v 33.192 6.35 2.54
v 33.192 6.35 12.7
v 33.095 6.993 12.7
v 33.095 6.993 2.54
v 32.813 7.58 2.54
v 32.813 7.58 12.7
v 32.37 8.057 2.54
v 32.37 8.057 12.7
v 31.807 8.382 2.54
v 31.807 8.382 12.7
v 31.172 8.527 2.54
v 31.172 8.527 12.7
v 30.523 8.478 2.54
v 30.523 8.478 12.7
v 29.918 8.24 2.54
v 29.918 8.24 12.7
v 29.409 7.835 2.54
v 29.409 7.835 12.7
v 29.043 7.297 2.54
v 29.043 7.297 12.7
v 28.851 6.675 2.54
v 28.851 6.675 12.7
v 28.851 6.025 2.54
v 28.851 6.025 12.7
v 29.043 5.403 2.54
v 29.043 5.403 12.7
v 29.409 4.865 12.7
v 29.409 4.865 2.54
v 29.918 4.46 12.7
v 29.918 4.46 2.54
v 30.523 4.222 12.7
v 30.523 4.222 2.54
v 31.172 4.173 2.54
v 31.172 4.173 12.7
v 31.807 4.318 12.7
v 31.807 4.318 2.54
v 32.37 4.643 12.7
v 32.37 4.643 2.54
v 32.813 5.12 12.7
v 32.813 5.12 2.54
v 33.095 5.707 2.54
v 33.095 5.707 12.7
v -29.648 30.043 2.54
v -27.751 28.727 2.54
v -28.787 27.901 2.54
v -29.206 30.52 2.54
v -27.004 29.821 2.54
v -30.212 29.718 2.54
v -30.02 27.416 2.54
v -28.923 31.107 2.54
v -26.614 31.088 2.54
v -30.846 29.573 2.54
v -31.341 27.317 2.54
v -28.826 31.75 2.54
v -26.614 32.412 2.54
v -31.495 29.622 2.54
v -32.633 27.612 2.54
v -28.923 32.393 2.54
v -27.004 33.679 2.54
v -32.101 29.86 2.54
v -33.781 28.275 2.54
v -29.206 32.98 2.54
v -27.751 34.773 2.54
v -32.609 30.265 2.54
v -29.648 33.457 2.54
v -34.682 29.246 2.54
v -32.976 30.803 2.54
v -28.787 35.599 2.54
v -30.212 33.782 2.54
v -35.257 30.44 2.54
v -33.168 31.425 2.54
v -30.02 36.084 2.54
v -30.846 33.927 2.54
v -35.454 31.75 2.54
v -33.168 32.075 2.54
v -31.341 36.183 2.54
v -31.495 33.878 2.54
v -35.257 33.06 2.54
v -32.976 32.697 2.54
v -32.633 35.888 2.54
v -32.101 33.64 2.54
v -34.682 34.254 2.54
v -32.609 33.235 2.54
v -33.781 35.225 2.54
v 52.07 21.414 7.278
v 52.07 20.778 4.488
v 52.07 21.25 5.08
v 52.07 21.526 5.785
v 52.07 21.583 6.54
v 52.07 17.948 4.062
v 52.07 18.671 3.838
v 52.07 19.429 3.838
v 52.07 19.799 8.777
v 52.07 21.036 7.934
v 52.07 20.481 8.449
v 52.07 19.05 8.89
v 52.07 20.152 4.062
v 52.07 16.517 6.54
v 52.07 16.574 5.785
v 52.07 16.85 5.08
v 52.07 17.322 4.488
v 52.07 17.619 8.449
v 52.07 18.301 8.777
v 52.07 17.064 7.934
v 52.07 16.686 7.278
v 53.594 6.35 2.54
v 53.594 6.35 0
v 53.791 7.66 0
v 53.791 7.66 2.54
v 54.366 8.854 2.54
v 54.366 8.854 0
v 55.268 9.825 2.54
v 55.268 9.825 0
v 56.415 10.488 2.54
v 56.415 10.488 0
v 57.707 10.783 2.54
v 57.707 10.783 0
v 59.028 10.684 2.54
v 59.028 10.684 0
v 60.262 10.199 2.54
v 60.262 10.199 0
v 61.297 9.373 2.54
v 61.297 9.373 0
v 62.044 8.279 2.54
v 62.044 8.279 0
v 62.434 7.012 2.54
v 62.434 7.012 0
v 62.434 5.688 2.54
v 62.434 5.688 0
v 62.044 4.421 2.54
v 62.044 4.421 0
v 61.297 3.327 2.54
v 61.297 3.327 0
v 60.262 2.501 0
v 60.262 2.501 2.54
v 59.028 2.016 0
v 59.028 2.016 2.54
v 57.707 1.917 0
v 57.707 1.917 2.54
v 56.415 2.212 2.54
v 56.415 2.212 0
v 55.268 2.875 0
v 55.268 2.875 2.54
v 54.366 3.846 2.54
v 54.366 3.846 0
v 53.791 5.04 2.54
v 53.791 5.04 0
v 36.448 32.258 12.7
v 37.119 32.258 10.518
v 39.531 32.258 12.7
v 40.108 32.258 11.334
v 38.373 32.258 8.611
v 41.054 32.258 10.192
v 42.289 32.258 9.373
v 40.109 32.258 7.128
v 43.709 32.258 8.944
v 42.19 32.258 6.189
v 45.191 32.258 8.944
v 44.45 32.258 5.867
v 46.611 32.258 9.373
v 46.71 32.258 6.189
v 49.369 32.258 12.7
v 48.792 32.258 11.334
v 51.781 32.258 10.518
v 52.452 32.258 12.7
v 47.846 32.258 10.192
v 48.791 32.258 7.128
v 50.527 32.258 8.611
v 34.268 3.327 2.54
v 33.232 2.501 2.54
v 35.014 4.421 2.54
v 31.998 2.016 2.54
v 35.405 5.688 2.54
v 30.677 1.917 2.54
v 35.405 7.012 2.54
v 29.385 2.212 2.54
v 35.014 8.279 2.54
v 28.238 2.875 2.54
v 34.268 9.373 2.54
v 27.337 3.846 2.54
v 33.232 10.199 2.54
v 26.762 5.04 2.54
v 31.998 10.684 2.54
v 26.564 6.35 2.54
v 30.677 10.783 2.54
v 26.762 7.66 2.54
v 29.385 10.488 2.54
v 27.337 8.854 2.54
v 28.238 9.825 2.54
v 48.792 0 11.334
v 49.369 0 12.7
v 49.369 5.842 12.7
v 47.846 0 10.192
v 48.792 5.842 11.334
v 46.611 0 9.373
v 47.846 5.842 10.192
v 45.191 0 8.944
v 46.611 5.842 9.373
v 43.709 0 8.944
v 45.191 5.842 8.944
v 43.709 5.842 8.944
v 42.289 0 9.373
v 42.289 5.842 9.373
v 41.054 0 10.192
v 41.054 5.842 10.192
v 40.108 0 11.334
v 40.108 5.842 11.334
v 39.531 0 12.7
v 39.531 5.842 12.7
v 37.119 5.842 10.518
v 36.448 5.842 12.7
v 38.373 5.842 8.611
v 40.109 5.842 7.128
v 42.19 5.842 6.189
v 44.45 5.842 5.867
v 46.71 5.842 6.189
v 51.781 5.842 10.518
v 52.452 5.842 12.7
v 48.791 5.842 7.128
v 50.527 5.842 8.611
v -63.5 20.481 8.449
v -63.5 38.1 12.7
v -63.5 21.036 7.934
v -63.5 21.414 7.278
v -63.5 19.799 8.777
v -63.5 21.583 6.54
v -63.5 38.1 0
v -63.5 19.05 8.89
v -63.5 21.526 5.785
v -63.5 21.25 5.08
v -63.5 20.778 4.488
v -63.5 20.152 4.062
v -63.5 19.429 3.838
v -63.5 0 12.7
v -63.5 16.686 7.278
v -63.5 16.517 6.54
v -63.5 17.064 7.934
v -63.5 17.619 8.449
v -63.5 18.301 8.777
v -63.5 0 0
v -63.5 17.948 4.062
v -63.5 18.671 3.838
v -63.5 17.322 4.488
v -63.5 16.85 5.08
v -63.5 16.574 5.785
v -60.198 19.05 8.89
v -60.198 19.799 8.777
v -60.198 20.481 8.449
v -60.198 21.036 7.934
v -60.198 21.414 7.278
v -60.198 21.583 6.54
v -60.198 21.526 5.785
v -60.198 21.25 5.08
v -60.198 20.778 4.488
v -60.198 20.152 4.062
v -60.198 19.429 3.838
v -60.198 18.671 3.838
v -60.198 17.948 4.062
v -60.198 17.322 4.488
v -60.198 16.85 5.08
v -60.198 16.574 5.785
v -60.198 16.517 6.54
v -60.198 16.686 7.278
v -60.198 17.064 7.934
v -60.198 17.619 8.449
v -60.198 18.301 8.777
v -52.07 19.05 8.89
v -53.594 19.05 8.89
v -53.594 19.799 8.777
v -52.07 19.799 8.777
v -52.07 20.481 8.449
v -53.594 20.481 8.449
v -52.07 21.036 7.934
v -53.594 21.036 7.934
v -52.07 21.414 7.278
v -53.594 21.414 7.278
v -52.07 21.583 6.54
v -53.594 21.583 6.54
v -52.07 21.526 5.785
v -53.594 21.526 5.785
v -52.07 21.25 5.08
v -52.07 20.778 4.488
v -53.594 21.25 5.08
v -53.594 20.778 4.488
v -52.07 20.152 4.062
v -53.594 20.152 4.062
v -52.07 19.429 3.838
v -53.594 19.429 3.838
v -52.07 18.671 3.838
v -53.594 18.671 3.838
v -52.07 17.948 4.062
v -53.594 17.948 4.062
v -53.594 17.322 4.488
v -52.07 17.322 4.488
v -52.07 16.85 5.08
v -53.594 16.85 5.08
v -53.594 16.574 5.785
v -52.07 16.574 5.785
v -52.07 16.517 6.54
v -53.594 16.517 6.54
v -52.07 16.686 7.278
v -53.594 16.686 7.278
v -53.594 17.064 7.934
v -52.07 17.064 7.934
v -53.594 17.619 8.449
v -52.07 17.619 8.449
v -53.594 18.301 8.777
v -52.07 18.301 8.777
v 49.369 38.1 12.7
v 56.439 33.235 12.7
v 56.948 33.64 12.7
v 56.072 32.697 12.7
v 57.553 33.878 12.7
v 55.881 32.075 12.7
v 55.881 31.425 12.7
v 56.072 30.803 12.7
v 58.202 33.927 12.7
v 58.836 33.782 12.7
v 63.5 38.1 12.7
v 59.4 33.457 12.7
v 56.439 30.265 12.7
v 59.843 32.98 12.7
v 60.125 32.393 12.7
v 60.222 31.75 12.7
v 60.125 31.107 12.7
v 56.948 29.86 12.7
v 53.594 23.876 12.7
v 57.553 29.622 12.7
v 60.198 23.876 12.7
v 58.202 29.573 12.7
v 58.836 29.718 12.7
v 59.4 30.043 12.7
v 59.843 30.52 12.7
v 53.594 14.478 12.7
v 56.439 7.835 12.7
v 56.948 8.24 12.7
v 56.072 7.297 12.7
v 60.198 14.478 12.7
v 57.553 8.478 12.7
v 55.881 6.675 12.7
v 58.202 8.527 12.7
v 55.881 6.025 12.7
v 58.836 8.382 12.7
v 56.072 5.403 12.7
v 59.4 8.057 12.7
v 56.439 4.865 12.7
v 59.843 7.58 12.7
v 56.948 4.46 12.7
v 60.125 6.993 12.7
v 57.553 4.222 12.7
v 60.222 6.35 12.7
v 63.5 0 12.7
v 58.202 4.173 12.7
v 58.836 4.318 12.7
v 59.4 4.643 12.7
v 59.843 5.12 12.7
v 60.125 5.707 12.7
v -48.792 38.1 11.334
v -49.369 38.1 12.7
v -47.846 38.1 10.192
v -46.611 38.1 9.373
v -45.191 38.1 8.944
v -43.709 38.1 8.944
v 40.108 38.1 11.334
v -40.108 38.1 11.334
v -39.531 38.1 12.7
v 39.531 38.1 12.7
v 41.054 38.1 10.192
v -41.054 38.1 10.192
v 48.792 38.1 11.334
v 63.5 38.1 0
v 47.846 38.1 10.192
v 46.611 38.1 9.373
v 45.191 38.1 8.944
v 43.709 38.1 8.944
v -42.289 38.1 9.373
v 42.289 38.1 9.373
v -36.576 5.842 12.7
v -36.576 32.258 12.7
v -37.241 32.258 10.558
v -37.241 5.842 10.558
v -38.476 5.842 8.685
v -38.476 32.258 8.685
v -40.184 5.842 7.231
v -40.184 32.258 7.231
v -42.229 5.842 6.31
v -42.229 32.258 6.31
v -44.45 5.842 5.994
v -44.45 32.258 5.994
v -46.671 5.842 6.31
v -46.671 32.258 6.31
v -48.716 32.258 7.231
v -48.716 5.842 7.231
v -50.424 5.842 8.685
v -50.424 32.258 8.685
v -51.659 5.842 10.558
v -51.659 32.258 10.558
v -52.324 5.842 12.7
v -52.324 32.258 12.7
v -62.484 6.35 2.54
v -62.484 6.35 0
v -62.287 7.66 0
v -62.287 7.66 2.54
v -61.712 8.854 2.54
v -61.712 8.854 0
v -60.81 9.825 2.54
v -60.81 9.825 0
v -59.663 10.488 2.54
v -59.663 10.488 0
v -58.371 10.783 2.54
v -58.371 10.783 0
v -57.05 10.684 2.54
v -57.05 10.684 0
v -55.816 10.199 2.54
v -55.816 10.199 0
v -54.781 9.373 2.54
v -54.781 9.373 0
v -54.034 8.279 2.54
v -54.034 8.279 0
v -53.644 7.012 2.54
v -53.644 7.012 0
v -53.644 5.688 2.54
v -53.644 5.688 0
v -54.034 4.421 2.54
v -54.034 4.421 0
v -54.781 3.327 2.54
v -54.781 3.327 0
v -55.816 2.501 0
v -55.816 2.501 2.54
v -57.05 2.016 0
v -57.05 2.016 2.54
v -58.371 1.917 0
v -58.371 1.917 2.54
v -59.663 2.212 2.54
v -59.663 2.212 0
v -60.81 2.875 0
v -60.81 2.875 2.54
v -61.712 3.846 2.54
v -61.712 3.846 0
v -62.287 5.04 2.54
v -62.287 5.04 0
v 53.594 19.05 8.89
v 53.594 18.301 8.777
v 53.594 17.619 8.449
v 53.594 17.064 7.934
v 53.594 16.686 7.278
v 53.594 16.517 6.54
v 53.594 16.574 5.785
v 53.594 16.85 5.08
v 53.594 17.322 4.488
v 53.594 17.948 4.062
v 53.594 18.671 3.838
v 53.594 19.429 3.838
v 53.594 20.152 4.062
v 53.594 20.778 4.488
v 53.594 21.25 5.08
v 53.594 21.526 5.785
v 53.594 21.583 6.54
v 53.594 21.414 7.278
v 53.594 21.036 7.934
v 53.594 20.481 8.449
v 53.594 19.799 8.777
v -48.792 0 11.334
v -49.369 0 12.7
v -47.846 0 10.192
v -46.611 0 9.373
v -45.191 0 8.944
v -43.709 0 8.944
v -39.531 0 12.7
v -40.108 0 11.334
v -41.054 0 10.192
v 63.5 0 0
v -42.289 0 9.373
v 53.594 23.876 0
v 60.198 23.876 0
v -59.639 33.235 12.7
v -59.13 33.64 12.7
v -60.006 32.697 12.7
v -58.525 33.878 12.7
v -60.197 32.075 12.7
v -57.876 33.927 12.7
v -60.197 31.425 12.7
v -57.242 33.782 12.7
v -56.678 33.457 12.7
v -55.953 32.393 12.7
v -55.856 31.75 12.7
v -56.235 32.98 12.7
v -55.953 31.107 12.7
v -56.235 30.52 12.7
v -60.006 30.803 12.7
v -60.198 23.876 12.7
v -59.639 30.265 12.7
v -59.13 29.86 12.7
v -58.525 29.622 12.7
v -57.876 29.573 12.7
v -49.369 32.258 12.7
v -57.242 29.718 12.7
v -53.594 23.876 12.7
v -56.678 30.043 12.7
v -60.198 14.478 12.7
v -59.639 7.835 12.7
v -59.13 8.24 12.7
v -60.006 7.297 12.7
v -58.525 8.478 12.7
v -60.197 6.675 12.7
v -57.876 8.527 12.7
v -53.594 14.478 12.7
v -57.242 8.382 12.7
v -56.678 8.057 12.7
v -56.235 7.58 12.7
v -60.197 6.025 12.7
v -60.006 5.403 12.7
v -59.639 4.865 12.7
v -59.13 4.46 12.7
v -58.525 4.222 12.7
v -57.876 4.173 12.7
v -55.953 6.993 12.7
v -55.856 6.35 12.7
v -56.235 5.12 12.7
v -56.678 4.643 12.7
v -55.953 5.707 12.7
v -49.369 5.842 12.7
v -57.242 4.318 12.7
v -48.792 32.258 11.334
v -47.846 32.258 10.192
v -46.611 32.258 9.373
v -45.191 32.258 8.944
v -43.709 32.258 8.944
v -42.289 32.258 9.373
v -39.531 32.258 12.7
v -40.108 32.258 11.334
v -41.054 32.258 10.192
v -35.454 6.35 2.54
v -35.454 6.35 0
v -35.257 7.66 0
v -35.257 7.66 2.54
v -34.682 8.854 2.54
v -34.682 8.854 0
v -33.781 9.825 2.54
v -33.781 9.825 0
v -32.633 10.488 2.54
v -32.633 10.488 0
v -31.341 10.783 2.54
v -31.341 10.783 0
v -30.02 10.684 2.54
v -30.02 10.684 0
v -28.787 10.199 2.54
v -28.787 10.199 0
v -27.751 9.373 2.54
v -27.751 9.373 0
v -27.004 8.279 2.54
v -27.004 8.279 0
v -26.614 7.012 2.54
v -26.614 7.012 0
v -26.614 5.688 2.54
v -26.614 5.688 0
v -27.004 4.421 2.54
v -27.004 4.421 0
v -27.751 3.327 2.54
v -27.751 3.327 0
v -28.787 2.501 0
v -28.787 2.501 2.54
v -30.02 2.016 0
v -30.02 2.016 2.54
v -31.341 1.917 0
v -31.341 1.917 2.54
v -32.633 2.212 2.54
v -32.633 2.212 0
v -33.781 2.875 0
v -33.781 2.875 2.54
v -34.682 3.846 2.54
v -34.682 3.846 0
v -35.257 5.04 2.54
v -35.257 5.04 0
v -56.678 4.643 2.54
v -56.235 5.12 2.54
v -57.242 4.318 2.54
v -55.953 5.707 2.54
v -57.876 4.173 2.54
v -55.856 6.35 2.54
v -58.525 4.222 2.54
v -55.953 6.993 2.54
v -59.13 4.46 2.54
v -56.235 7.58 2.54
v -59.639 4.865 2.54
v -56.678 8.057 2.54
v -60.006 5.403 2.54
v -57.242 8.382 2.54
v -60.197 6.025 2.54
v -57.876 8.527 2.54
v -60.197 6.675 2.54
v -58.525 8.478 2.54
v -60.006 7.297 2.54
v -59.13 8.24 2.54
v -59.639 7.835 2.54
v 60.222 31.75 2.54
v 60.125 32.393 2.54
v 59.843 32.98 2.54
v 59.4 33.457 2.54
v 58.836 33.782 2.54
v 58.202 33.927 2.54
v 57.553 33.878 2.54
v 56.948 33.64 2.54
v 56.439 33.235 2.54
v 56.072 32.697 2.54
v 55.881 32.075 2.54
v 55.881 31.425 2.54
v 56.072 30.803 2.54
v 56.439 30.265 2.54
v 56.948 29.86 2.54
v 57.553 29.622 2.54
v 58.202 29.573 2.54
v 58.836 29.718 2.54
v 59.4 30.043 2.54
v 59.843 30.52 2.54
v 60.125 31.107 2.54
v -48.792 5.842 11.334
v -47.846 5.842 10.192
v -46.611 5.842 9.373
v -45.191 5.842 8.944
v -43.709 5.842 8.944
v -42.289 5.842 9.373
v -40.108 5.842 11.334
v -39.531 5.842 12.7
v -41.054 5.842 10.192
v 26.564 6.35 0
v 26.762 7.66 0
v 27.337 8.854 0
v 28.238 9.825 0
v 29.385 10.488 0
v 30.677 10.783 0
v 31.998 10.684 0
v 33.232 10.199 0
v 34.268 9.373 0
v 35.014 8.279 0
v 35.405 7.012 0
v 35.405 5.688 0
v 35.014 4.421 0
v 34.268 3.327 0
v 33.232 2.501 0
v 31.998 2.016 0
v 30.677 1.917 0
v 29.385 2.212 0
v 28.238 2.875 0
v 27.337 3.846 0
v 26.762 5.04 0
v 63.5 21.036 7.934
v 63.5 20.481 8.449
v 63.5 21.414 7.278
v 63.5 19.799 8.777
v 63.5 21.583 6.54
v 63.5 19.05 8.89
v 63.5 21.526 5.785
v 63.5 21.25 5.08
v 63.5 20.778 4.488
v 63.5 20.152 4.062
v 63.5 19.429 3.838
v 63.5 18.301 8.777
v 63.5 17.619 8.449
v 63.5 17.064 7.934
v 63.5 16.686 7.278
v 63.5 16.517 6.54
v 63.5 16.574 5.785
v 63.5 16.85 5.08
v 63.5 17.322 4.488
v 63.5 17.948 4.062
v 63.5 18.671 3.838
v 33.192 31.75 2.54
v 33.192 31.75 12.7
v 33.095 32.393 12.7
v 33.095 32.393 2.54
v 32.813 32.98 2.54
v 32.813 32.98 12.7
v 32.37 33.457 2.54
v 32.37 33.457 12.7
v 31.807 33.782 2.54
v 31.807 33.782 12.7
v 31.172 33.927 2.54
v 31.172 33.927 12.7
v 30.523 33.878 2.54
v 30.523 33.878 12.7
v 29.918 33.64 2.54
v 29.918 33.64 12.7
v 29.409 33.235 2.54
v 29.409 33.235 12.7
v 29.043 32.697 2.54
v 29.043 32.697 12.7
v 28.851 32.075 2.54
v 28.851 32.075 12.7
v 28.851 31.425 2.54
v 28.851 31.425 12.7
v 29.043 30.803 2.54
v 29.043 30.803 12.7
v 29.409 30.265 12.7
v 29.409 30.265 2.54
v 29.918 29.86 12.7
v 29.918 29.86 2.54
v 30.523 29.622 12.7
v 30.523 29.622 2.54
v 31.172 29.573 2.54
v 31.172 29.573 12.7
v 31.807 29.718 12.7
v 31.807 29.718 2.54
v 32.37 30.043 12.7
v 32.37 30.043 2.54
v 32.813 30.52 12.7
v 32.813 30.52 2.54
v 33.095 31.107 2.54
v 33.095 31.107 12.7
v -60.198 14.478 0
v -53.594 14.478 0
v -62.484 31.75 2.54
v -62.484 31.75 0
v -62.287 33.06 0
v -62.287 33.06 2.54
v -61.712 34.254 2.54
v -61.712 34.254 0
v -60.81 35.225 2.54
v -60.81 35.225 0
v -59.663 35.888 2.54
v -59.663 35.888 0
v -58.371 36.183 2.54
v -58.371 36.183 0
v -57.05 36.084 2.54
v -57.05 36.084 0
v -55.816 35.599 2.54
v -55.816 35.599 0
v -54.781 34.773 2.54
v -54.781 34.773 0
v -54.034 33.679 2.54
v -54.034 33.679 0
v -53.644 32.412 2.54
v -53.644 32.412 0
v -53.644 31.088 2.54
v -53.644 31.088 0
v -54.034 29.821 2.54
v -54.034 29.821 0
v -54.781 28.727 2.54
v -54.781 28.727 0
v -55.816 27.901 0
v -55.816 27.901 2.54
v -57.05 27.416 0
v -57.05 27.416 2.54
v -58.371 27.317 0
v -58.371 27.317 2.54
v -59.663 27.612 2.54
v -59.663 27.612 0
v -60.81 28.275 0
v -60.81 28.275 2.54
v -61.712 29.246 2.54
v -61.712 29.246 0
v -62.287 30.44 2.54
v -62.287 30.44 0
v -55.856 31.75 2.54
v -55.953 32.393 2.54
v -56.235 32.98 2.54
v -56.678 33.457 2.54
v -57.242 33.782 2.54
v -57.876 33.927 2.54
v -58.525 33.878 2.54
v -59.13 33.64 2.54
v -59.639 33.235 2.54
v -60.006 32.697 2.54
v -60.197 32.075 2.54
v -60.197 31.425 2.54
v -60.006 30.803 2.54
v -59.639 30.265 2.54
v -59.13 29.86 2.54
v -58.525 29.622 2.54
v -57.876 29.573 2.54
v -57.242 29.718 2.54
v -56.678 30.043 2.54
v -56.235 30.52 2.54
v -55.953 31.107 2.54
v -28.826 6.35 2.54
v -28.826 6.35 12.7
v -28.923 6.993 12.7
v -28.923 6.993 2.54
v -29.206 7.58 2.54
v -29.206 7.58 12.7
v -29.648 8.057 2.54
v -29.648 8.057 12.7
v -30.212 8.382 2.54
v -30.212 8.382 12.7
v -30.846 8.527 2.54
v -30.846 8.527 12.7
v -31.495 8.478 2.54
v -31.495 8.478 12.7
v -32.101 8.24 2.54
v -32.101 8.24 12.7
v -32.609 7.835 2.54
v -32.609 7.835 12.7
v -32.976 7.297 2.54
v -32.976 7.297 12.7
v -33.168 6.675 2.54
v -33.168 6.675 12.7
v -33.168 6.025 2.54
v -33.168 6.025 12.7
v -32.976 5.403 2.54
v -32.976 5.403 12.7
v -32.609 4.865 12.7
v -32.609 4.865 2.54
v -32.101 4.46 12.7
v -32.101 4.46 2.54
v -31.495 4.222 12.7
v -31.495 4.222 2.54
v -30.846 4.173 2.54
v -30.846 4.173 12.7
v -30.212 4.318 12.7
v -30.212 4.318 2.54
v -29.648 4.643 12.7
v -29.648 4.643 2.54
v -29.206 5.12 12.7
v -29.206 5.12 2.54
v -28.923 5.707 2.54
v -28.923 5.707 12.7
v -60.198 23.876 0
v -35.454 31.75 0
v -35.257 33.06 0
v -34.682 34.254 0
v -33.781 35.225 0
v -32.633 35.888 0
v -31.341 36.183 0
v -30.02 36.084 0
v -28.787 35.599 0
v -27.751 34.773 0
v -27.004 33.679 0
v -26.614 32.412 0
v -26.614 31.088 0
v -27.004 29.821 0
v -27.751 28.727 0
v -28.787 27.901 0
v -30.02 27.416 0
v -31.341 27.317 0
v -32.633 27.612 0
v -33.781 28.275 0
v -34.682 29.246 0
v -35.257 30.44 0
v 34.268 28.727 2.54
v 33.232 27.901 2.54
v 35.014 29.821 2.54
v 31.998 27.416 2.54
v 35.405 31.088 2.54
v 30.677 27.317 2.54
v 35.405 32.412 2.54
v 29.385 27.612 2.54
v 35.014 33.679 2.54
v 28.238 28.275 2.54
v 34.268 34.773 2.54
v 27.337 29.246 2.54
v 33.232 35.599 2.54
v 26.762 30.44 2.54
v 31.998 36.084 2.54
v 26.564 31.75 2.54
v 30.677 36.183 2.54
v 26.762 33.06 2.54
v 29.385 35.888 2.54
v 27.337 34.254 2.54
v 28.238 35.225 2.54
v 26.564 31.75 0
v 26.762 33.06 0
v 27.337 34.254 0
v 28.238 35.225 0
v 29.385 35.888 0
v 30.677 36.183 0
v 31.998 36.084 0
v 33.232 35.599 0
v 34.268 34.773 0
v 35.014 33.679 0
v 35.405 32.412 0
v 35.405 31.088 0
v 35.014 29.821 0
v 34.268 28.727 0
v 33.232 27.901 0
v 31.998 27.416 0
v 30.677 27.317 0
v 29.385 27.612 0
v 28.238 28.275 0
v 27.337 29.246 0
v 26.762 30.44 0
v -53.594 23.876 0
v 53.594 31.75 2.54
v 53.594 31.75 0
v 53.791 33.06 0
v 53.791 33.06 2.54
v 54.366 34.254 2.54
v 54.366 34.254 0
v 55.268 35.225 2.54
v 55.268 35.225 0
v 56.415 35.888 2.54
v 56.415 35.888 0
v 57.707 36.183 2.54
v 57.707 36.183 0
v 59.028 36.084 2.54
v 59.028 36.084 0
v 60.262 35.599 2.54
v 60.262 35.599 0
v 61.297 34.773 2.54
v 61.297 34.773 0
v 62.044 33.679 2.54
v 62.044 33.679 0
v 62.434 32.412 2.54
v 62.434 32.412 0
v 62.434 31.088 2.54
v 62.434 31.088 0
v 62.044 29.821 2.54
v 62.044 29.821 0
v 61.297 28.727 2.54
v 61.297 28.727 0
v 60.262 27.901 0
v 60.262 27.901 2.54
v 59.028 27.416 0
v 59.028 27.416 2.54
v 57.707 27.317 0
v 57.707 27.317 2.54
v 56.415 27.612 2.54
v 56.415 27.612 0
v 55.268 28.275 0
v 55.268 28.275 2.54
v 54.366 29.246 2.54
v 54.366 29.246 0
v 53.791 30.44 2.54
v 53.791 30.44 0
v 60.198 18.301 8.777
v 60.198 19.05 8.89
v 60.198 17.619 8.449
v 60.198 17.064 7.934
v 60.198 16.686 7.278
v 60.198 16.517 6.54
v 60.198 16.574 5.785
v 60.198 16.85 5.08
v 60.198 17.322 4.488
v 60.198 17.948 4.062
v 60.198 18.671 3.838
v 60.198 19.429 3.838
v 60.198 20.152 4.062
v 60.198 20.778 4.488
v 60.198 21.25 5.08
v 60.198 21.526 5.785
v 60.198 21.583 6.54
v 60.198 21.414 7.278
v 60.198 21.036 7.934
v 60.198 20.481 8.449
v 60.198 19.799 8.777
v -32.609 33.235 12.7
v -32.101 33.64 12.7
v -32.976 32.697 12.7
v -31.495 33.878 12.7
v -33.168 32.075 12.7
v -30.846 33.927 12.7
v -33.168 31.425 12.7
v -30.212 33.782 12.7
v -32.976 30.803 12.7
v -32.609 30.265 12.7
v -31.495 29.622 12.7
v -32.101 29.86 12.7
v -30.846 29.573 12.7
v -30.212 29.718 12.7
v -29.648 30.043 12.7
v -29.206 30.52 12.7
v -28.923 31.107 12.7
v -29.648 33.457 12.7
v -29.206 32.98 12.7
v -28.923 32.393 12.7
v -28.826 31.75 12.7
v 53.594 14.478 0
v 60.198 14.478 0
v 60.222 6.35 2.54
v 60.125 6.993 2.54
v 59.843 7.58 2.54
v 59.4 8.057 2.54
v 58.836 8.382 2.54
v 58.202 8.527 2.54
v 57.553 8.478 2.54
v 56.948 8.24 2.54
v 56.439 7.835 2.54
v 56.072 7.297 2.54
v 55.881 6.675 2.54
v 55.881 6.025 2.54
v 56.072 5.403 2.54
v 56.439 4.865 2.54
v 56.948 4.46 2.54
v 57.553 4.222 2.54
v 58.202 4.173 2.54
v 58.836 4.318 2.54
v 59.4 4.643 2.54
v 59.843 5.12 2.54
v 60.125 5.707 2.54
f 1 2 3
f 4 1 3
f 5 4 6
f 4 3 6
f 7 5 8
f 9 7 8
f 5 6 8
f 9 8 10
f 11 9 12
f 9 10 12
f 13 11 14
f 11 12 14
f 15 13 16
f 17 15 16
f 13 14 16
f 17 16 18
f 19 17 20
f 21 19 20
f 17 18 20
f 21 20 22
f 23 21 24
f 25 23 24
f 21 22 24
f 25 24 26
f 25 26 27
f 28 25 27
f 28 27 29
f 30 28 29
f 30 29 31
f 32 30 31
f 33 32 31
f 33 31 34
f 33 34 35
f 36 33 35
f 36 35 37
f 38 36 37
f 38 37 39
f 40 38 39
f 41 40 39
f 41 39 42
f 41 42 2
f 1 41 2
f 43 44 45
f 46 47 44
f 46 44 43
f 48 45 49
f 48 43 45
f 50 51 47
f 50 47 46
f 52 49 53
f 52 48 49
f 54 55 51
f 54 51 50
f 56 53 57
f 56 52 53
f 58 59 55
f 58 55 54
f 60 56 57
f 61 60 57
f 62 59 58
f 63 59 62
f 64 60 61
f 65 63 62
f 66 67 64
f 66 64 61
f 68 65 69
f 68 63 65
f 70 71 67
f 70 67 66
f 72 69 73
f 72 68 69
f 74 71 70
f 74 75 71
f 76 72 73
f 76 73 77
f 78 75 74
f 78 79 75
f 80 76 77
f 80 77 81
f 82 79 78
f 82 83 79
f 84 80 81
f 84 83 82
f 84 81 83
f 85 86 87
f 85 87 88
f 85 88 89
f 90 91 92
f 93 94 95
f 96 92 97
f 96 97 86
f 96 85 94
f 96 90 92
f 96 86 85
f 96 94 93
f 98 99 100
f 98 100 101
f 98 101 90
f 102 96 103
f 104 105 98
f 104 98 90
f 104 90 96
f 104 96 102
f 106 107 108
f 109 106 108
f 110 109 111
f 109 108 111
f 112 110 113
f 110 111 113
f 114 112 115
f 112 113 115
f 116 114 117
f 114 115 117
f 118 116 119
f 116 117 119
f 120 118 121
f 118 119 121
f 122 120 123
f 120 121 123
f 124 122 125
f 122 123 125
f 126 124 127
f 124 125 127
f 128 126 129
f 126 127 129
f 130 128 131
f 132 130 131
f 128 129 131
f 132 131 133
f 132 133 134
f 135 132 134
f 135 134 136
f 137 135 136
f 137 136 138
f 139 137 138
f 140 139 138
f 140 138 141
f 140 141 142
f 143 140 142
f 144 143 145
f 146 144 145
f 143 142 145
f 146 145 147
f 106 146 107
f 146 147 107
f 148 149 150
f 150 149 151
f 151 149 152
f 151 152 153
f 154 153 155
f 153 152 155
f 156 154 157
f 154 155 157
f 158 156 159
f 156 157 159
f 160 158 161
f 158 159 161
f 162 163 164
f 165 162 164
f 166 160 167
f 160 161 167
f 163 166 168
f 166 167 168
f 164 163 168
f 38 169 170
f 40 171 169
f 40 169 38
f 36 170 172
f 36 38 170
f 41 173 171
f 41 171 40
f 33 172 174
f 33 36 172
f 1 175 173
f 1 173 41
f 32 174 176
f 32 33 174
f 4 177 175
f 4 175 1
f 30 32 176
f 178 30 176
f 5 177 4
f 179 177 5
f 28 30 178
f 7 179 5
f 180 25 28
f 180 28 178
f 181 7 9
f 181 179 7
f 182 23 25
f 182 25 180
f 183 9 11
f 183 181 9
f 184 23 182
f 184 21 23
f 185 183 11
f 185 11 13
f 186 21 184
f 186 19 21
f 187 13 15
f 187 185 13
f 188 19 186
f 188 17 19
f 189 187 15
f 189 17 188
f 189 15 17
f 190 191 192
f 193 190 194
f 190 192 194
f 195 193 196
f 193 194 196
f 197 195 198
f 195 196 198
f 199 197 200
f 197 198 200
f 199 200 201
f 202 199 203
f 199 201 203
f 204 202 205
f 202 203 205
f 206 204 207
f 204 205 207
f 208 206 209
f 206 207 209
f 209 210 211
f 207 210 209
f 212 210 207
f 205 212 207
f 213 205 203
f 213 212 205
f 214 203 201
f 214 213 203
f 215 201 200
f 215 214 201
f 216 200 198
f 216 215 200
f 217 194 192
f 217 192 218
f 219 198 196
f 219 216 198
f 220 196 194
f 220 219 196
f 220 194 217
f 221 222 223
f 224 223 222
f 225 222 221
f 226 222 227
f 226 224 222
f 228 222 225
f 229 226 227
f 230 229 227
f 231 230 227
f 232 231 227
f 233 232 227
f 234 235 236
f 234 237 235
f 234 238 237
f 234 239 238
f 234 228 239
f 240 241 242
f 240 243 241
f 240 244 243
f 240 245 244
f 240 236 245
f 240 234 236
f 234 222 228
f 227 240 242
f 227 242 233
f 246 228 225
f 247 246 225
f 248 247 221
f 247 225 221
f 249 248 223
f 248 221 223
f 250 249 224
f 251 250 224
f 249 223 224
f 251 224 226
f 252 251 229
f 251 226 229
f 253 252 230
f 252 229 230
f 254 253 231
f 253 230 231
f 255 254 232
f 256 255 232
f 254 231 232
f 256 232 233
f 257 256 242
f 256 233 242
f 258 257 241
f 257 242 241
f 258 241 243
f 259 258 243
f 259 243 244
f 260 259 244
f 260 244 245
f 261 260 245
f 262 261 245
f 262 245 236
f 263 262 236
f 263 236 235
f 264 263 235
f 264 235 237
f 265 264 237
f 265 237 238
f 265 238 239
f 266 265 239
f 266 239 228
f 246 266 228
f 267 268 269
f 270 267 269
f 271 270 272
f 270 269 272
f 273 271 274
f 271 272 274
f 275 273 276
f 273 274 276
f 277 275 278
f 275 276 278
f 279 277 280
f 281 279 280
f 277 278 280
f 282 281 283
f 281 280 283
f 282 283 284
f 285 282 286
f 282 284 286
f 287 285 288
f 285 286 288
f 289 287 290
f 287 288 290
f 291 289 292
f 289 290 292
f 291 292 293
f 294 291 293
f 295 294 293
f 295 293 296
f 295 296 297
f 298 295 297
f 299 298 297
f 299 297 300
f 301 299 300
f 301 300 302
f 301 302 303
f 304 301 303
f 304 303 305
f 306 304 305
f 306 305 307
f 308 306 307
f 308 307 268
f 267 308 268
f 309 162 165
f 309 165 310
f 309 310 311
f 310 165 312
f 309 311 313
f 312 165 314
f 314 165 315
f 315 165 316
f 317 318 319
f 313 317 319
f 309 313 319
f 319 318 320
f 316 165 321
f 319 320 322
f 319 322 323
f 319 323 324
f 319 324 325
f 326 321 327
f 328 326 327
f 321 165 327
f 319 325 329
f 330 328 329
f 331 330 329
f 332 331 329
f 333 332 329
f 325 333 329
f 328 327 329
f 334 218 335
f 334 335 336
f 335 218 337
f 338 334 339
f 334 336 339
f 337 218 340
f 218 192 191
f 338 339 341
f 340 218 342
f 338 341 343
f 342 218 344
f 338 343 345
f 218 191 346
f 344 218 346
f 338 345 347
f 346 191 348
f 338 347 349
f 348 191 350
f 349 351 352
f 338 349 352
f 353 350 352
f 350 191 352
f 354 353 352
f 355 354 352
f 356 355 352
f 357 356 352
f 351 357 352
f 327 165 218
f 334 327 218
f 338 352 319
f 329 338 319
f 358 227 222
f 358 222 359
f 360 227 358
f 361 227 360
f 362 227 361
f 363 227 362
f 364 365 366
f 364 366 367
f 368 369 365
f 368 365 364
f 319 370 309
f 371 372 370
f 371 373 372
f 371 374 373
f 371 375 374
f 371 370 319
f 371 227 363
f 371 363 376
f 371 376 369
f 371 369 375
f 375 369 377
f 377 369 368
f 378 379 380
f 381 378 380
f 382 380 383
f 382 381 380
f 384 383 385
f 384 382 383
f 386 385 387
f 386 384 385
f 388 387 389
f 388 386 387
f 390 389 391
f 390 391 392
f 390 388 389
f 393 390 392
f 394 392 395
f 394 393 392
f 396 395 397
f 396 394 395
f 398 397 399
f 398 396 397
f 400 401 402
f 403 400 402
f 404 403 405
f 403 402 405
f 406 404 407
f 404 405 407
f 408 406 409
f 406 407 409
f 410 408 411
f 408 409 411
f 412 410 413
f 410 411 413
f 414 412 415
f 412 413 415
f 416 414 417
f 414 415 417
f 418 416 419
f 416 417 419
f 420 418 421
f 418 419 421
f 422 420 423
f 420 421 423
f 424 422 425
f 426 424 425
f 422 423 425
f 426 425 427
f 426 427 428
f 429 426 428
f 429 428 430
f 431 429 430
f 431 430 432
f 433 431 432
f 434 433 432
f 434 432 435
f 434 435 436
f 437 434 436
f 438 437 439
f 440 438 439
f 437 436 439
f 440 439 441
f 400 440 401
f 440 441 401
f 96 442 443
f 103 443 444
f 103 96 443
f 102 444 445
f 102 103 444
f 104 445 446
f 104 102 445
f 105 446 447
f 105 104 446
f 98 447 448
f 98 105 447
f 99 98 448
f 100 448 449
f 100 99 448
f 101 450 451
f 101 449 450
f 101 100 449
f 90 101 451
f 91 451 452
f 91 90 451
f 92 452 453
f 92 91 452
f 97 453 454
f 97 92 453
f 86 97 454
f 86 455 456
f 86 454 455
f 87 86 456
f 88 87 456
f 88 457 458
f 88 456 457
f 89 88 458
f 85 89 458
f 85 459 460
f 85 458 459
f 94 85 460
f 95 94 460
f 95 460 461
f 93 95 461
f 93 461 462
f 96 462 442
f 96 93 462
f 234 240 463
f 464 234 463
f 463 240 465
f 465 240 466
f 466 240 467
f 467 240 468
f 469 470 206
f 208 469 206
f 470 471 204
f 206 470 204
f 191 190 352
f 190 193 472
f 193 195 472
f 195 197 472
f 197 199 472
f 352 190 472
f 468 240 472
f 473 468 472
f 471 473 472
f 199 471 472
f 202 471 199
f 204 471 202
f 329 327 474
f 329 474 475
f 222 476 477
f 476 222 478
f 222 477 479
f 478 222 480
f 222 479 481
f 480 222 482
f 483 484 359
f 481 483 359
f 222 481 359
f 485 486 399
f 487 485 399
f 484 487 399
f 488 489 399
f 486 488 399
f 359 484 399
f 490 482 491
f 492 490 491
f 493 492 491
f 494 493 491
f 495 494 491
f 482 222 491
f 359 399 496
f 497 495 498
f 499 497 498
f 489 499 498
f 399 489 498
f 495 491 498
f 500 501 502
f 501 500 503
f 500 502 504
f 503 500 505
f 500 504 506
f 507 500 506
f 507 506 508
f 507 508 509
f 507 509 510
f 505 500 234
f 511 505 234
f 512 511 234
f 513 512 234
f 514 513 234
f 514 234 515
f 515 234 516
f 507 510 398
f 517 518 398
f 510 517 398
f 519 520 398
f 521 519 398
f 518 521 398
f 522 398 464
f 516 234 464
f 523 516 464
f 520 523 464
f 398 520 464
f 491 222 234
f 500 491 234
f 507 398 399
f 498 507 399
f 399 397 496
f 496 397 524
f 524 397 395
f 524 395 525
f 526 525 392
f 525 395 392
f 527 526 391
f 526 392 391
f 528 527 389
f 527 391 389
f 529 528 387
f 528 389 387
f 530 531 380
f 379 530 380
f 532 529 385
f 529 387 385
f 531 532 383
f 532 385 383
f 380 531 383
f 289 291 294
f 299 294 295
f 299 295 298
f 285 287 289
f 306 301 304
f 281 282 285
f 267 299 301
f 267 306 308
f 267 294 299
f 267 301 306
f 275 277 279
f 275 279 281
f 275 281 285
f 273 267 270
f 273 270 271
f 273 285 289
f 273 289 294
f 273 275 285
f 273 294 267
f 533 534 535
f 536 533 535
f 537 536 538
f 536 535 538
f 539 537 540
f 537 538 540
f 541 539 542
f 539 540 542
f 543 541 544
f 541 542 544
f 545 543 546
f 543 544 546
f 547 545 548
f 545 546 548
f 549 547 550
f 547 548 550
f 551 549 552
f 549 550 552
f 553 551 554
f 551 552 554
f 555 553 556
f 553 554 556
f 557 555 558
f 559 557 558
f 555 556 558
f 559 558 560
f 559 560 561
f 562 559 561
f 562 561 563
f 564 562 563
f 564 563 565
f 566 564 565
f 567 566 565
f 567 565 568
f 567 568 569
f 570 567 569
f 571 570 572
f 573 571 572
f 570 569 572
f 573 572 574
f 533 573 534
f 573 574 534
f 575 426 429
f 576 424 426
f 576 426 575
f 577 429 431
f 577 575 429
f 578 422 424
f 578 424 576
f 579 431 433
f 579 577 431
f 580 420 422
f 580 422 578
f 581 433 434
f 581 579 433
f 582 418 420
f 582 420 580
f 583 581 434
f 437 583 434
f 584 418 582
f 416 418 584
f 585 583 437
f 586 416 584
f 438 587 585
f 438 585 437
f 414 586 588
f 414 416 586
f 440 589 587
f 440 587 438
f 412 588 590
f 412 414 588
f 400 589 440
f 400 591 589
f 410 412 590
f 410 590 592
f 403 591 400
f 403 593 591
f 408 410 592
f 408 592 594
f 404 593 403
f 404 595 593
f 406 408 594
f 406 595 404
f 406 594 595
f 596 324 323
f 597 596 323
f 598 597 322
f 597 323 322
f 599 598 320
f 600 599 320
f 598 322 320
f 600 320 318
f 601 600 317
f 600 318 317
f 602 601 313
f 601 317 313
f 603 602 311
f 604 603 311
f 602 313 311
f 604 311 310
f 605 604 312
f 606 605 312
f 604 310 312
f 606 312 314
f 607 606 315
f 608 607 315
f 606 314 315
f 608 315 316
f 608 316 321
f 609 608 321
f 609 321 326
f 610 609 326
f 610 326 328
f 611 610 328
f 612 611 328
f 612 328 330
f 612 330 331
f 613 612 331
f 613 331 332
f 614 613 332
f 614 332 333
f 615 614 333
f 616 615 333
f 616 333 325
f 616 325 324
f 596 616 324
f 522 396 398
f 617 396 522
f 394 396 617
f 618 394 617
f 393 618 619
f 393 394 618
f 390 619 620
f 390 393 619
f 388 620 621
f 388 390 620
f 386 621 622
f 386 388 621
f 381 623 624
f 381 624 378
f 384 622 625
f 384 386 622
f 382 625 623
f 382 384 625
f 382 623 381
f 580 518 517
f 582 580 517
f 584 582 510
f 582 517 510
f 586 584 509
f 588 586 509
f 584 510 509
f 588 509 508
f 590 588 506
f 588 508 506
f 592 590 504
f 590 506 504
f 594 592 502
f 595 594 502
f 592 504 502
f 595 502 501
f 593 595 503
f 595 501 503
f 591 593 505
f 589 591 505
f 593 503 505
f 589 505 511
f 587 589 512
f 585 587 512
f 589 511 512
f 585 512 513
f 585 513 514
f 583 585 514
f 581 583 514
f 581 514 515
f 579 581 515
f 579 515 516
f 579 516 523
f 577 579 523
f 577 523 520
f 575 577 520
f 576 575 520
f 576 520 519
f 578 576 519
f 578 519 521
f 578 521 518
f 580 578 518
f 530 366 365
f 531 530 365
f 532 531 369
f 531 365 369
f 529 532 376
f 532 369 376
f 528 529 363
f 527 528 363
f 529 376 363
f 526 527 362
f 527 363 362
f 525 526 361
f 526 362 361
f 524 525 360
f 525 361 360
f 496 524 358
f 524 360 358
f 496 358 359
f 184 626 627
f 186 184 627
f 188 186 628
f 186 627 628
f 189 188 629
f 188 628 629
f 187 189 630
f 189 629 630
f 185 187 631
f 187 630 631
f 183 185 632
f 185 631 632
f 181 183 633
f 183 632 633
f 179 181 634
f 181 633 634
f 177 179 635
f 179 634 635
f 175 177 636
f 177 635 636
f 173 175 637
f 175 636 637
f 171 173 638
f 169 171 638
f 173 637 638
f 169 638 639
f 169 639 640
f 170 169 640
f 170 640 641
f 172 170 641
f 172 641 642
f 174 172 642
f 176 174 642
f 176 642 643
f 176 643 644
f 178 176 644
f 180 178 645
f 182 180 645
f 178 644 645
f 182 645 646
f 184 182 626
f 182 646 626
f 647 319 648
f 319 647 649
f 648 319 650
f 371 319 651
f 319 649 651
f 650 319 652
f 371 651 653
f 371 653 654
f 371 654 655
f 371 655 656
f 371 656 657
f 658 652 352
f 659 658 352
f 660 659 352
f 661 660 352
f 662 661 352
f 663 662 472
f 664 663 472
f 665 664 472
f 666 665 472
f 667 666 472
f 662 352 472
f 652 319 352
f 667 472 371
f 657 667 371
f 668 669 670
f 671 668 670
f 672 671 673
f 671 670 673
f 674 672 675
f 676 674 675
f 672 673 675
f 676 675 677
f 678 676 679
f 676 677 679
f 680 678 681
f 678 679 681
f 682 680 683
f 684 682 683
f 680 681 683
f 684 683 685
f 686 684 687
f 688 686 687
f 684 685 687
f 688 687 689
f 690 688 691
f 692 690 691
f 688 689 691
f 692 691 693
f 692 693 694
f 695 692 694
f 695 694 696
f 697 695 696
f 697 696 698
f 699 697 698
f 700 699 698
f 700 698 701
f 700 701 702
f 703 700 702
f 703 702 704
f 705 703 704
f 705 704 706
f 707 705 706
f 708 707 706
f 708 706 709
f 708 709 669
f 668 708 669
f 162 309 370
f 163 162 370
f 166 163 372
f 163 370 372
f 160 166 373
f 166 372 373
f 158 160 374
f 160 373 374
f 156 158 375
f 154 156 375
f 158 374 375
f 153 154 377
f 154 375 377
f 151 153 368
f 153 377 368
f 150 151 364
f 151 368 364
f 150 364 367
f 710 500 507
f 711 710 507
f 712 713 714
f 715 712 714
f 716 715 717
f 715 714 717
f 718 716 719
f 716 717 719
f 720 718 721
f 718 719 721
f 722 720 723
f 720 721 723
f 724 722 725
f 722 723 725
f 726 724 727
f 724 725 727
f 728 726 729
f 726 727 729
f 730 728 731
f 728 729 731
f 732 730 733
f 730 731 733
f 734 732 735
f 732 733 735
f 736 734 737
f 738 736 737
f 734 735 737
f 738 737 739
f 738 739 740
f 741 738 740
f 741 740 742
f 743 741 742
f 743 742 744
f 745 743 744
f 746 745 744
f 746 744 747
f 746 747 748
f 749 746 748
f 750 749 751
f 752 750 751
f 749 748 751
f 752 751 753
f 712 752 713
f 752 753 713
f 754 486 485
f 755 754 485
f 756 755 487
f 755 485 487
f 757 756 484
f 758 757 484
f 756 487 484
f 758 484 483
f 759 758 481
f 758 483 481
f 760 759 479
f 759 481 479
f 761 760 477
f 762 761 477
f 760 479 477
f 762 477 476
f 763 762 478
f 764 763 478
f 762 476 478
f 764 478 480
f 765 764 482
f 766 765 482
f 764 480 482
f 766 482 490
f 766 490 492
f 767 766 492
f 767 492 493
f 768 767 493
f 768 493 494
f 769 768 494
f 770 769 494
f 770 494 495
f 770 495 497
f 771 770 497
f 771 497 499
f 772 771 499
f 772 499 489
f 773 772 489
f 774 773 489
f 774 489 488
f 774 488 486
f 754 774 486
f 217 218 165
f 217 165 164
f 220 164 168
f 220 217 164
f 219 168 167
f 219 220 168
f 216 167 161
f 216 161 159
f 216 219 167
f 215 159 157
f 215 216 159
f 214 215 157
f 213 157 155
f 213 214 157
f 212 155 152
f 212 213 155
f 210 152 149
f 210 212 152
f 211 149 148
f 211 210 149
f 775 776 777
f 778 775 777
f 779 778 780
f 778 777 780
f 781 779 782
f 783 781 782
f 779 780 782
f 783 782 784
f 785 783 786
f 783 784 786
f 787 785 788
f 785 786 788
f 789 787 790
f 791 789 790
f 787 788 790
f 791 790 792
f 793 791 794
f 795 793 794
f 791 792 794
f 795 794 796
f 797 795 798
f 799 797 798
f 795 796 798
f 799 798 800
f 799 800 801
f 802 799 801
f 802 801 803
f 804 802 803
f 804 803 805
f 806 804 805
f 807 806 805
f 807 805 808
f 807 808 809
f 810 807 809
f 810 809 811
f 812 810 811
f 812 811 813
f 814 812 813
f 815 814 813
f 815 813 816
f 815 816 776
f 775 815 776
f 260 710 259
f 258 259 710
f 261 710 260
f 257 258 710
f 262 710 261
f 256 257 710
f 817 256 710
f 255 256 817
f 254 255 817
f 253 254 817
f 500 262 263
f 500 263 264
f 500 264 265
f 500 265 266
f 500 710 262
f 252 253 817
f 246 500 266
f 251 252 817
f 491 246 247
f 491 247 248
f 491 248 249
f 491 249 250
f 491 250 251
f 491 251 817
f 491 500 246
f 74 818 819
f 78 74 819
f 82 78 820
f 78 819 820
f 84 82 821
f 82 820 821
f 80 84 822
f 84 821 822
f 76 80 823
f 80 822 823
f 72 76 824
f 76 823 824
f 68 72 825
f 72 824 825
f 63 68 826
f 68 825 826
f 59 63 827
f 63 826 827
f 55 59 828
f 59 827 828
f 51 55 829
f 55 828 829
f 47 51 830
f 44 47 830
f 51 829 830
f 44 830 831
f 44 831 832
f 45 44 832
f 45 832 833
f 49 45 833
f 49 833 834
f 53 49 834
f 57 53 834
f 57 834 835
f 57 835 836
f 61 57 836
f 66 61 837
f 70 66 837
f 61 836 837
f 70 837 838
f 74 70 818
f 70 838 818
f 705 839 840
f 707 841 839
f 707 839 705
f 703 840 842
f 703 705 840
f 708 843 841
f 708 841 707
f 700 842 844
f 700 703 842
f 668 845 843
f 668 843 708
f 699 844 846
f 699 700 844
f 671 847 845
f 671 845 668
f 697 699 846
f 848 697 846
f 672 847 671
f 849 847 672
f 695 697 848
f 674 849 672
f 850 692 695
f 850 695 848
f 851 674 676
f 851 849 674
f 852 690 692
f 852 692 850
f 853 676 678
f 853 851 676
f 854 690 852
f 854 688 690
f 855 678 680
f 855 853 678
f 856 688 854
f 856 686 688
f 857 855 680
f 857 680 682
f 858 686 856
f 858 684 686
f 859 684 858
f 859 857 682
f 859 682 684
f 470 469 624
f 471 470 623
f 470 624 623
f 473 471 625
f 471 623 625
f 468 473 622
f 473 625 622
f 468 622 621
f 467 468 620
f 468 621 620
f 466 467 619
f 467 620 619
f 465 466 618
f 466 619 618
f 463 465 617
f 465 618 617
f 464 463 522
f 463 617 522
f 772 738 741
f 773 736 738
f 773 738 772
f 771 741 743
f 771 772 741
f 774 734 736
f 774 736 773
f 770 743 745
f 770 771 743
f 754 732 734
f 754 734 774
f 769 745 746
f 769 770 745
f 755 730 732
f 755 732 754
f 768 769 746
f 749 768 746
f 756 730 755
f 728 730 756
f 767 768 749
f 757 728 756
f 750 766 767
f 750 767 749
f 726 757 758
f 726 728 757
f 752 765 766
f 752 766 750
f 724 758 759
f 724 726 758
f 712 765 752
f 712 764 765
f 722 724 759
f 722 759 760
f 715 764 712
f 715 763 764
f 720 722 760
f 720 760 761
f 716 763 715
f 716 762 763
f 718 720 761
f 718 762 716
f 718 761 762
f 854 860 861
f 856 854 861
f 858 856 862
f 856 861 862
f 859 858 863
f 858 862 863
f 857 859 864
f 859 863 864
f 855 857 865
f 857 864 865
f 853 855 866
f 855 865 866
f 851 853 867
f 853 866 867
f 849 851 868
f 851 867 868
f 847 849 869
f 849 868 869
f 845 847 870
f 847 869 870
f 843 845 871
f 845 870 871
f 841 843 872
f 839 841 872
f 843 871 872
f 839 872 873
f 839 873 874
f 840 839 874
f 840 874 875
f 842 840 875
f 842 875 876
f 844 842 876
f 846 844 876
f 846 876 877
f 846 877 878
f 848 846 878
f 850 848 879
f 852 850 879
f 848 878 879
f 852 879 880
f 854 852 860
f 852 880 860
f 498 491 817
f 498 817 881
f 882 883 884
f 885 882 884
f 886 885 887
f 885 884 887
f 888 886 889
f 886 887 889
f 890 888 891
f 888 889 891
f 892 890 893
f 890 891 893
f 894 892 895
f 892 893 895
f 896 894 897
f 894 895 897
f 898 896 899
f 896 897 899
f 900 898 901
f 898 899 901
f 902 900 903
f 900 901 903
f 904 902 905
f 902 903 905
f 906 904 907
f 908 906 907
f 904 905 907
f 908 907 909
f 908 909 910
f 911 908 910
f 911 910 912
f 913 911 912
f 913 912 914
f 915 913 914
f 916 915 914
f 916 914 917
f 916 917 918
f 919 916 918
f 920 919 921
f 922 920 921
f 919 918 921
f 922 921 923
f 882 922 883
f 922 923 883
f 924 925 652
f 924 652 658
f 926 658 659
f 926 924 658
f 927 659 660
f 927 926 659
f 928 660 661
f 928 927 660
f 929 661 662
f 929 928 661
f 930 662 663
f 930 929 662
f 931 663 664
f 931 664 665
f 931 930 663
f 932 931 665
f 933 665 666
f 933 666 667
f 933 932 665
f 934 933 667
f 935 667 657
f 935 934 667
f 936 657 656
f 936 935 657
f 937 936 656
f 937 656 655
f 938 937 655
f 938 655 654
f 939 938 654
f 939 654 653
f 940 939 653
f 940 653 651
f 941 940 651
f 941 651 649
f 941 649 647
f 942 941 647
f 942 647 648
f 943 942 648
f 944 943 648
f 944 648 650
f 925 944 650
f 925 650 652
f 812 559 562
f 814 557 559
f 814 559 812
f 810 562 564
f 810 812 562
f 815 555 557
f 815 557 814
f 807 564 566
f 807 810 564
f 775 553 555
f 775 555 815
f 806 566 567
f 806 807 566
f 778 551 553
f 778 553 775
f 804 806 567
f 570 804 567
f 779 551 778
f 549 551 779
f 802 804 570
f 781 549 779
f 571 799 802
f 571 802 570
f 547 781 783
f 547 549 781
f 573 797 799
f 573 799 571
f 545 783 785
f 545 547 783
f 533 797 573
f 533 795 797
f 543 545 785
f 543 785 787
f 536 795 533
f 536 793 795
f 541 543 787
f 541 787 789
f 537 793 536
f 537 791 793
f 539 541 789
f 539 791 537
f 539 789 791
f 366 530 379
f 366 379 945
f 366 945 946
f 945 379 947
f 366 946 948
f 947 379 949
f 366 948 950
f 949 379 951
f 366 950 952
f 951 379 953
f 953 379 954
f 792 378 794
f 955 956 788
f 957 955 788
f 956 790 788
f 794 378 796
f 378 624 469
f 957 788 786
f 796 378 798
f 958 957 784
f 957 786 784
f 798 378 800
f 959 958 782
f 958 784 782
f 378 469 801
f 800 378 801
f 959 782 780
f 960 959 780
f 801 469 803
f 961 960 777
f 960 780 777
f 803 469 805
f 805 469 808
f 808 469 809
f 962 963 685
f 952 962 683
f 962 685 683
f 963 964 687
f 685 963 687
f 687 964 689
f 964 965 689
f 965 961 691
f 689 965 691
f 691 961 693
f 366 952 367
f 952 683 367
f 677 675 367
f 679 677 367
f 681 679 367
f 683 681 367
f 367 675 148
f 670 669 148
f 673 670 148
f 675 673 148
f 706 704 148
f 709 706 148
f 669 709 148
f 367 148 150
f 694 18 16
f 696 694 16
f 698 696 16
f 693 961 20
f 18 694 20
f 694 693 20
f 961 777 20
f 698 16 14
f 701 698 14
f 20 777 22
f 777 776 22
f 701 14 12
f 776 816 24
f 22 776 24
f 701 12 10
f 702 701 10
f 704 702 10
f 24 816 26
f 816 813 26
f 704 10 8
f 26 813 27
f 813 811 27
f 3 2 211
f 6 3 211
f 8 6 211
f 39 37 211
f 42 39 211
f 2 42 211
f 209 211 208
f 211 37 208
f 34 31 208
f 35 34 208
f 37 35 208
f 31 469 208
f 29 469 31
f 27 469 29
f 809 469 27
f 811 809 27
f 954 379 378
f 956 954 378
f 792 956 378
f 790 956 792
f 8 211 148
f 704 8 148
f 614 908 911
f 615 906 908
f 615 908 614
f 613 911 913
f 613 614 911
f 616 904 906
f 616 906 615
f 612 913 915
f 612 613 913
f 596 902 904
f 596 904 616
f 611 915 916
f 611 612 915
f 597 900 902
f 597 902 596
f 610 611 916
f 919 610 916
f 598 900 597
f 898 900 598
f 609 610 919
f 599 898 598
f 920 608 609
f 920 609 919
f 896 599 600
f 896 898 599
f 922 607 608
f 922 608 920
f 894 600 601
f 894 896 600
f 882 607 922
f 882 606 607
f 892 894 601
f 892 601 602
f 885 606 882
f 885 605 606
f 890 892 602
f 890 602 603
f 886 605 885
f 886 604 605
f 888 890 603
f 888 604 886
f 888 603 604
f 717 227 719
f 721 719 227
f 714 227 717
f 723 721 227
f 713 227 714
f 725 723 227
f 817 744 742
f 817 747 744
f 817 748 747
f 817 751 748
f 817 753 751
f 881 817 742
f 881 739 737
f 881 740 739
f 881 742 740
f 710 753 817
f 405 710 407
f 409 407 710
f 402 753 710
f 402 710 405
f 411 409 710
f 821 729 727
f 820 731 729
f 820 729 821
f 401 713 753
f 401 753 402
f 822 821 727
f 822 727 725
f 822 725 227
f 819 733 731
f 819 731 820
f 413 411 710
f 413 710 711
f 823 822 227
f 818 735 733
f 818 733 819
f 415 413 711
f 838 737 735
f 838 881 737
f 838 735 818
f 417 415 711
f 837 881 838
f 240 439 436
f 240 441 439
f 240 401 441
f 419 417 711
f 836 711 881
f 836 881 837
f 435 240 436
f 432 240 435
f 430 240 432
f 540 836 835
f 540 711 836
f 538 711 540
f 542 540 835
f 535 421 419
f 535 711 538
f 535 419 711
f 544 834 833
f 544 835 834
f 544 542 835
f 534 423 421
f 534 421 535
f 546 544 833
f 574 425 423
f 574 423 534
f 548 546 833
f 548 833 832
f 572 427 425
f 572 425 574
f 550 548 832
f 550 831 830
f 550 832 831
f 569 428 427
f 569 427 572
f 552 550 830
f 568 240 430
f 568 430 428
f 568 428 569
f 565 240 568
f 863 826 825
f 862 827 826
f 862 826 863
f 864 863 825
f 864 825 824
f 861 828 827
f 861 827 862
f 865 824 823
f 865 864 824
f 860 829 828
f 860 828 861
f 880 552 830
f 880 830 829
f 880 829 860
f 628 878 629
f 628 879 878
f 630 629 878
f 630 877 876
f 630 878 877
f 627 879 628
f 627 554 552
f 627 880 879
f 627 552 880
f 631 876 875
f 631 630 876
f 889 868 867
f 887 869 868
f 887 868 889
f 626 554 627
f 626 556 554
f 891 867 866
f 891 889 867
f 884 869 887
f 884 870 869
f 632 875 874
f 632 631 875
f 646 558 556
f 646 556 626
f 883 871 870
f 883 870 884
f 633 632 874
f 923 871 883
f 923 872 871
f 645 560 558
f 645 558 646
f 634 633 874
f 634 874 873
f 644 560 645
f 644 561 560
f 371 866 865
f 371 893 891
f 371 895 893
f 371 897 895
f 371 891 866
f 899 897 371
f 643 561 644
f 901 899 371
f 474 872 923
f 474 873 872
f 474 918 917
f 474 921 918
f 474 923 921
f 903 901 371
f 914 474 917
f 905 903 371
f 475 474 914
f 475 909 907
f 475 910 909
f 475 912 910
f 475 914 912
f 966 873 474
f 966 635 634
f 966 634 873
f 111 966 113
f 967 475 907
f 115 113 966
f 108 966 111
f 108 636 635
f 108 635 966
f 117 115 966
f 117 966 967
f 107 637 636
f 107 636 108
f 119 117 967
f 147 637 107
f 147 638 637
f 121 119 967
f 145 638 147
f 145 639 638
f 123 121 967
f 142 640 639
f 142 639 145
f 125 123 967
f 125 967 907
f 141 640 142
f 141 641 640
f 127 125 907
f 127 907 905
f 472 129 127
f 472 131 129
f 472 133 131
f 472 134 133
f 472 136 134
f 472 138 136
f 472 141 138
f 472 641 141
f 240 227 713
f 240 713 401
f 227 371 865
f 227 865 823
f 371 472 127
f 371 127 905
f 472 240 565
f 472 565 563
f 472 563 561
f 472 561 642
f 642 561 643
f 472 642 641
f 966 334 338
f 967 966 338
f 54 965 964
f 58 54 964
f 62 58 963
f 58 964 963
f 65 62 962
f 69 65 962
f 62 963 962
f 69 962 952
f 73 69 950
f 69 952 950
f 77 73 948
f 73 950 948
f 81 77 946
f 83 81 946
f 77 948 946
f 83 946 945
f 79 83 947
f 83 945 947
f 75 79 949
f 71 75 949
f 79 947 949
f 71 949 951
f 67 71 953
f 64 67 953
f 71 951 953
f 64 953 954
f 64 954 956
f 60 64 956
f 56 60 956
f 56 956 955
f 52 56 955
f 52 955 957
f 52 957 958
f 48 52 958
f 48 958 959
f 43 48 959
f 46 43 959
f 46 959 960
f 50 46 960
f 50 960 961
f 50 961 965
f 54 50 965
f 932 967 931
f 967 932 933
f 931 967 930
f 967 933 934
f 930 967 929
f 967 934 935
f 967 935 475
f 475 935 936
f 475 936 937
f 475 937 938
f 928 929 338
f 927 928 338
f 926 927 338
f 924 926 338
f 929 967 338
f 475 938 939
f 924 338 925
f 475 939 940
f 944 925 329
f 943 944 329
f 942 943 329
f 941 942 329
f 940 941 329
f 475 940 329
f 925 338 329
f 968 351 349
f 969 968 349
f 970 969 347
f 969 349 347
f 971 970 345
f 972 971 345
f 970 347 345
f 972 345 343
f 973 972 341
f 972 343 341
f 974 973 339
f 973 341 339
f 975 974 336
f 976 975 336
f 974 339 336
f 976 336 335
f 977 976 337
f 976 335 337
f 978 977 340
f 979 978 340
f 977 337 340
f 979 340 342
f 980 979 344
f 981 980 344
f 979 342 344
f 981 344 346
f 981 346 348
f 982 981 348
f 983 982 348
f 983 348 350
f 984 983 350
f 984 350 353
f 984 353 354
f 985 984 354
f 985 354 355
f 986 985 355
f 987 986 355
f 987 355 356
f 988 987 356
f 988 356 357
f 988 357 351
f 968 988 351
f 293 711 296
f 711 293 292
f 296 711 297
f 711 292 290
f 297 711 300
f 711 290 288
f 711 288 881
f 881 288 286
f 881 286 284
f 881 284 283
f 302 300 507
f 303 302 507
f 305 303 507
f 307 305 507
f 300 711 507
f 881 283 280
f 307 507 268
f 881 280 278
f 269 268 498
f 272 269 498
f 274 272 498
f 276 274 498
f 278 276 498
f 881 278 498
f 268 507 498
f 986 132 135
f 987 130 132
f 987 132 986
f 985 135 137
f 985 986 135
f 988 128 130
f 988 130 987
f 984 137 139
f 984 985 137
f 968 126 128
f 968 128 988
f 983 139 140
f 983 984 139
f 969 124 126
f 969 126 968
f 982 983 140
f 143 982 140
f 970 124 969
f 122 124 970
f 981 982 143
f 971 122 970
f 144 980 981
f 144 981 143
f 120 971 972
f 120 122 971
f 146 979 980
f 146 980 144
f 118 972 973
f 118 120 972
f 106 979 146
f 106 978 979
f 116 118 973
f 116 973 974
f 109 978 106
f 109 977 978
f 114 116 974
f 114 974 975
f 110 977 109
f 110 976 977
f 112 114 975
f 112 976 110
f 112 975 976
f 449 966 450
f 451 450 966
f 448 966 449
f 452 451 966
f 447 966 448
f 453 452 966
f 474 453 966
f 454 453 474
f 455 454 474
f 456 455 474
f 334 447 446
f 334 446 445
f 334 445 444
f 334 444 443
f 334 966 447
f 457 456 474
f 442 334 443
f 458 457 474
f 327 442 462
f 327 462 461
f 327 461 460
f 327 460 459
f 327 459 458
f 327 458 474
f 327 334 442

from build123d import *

# Parameters (mm, degrees)
SKETCH1_W                                      = 127
SKETCH1_H                                      = 12.7
BOSS_EXTRUDE1_DEPTH                            = 38.1
SKETCH3_R                                      = 4.445
CUT_EXTRUDE3_DEPTH                             = 2.54
CUT_EXTRUDE4_DEPTH                             = 13.208
CUT_EXTRUDE4_DEPTH_BACK                        = 13.208
SKETCH2_R                                      = 7.9756
SKETCH2_R_2                                    = 8.1026
SKETCH6_R                                      = 5.08
CUT_EXTRUDE5_DEPTH                             = 38.1
F_11_64_0_17188_DIAMETER_HOLE1_D               = 4.365752
F_11_64_0_17188_DIAMETER_HOLE1_DEPTH           = 25.4
F_11_64_0_17188_DIAMETER_HOLE1_TIP             = 1.311604225
F_11_64_0_17188_DIAMETER_HOLE1_ON_FACE_2_D     = 4.365752
F_11_64_0_17188_DIAMETER_HOLE1_ON_FACE_2_DEPTH = 25.4
F_11_64_0_17188_DIAMETER_HOLE1_ON_FACE_2_TIP   = 1.311604225
SKETCH9_R                                      = 2.54
CUT_EXTRUDE7_DEPTH                             = 11.43
SKETCH10_W                                     = 6.604
SKETCH10_H                                     = 9.398
CUT_EXTRUDE10_DEPTH                            = 76.134213245
CUT_EXTRUDE11_START                            = -11.43
SKETCH11_R                                     = 2.54
CUT_EXTRUDE11_DEPTH                            = 11.43


with BuildPart() as part:
    # Sketch1 → Boss-Extrude1 (new body)
    with BuildSketch(Plane(origin=(0, 0, 0), x_dir=(1, 0, 0), z_dir=(0, 1, 0))):
        with Locations((0, -6.35)):
            Rectangle(SKETCH1_W, SKETCH1_H)
    extrude(amount=BOSS_EXTRUDE1_DEPTH)

    # Sketch3 → Cut-Extrude3 (cut)
    with BuildSketch(Plane(origin=(0, 0, 0), x_dir=(-1, 0, 0), z_dir=(0, 0, -1))):
        with Locations((-58.039, 31.75)):
            Circle(SKETCH3_R)
        with Locations((-58.039, 6.35)):
            Circle(SKETCH3_R)
        with Locations((-31.009232106, 31.75)):
            Circle(SKETCH3_R)
        with Locations((-31.009232106, 6.35)):
            Circle(SKETCH3_R)
        with Locations((31.009232106, 31.75)):
            Circle(SKETCH3_R)
        with Locations((31.009232106, 6.35)):
            Circle(SKETCH3_R)
        with Locations((58.039, 31.75)):
            Circle(SKETCH3_R)
        with Locations((58.039, 6.35)):
            Circle(SKETCH3_R)
    extrude(amount=-CUT_EXTRUDE3_DEPTH, mode=Mode.SUBTRACT)

    # Sketch2 → Cut-Extrude4 (cut, two sides: drawn at the far end of the back side and taken through both)
    with BuildSketch(Plane(origin=(0, 19.05, 0), x_dir=(1, 0, 0), z_dir=(0, 1, 0)).offset(-CUT_EXTRUDE4_DEPTH_BACK)):
        with Locations((-44.45, -13.97)):
            Circle(SKETCH2_R)
        with Locations((44.45, -13.97)):
            Circle(SKETCH2_R_2)
    extrude(amount=CUT_EXTRUDE4_DEPTH + CUT_EXTRUDE4_DEPTH_BACK, mode=Mode.SUBTRACT)

    # Sketch6 → Cut-Extrude5 (cut)
    with BuildSketch(Plane(origin=(0, 38.1, 0), x_dir=(1, 0, 0), z_dir=(0, 1, 0))):
        with Locations((-44.45, -13.97)):
            Circle(SKETCH6_R)
        with Locations((44.45, -13.97)):
            Circle(SKETCH6_R)
    extrude(amount=-CUT_EXTRUDE5_DEPTH, mode=Mode.SUBTRACT)

    # 11/64 (0.17188) Diameter Hole1
    with Locations(Plane(origin=(58.039, 31.75, 0), x_dir=(-1, 0, 0), z_dir=(0, 0, -1))):
        with Locations((0, 0), (27.029767894, 0), (27.029767894, -25.4), (89.048232106, -25.4), (116.078, 0)):
            Hole(F_11_64_0_17188_DIAMETER_HOLE1_D / 2, depth=F_11_64_0_17188_DIAMETER_HOLE1_DEPTH)
            with Locations((0, 0, -(F_11_64_0_17188_DIAMETER_HOLE1_DEPTH + F_11_64_0_17188_DIAMETER_HOLE1_TIP / 2))):  # 118° drill point
                Cone(0, F_11_64_0_17188_DIAMETER_HOLE1_D / 2, F_11_64_0_17188_DIAMETER_HOLE1_TIP, mode=Mode.SUBTRACT)

    # 11/64 (0.17188) Diameter Hole1 on face 2
    with Locations(Plane(origin=(58.039, 6.35, 2.54), x_dir=(-1, 0, 0), z_dir=(0, 0, -1))):
        with Locations((0, 0), (89.048232106, 25.4), (116.078, 0)):
            Hole(F_11_64_0_17188_DIAMETER_HOLE1_ON_FACE_2_D / 2, depth=F_11_64_0_17188_DIAMETER_HOLE1_ON_FACE_2_DEPTH)
            with Locations((0, 0, -(F_11_64_0_17188_DIAMETER_HOLE1_ON_FACE_2_DEPTH + F_11_64_0_17188_DIAMETER_HOLE1_ON_FACE_2_TIP / 2))):  # 118° drill point
                Cone(0, F_11_64_0_17188_DIAMETER_HOLE1_ON_FACE_2_D / 2, F_11_64_0_17188_DIAMETER_HOLE1_ON_FACE_2_TIP, mode=Mode.SUBTRACT)

    # Sketch9 → Cut-Extrude7 (cut)
    with BuildSketch(Plane.ZY.offset(63.5)):
        with Locations((6.35, 19.05)):
            Circle(SKETCH9_R)
    extrude(amount=-CUT_EXTRUDE7_DEPTH, mode=Mode.SUBTRACT)

    # Sketch10 → Cut-Extrude10 (cut, through all)
    with BuildSketch(Plane.XY.offset(12.7)):
        with Locations((-56.895836127, 19.177)):
            Rectangle(SKETCH10_W, SKETCH10_H)
        with Locations((56.895836127, 19.177)):
            Rectangle(SKETCH10_W, SKETCH10_H)
    extrude(amount=-CUT_EXTRUDE10_DEPTH, mode=Mode.SUBTRACT)

    # Sketch11 → Cut-Extrude11 (cut)
    with BuildSketch(Plane(origin=(63.5, 0, 0), x_dir=(0, 0, -1), z_dir=(1, 0, 0)).offset(CUT_EXTRUDE11_START)):
        with Locations(Location((-6.35, 19.05, 0), (0, 0, 180))):
            Circle(SKETCH11_R)
    extrude(amount=CUT_EXTRUDE11_DEPTH, mode=Mode.SUBTRACT)


solid = part.part
